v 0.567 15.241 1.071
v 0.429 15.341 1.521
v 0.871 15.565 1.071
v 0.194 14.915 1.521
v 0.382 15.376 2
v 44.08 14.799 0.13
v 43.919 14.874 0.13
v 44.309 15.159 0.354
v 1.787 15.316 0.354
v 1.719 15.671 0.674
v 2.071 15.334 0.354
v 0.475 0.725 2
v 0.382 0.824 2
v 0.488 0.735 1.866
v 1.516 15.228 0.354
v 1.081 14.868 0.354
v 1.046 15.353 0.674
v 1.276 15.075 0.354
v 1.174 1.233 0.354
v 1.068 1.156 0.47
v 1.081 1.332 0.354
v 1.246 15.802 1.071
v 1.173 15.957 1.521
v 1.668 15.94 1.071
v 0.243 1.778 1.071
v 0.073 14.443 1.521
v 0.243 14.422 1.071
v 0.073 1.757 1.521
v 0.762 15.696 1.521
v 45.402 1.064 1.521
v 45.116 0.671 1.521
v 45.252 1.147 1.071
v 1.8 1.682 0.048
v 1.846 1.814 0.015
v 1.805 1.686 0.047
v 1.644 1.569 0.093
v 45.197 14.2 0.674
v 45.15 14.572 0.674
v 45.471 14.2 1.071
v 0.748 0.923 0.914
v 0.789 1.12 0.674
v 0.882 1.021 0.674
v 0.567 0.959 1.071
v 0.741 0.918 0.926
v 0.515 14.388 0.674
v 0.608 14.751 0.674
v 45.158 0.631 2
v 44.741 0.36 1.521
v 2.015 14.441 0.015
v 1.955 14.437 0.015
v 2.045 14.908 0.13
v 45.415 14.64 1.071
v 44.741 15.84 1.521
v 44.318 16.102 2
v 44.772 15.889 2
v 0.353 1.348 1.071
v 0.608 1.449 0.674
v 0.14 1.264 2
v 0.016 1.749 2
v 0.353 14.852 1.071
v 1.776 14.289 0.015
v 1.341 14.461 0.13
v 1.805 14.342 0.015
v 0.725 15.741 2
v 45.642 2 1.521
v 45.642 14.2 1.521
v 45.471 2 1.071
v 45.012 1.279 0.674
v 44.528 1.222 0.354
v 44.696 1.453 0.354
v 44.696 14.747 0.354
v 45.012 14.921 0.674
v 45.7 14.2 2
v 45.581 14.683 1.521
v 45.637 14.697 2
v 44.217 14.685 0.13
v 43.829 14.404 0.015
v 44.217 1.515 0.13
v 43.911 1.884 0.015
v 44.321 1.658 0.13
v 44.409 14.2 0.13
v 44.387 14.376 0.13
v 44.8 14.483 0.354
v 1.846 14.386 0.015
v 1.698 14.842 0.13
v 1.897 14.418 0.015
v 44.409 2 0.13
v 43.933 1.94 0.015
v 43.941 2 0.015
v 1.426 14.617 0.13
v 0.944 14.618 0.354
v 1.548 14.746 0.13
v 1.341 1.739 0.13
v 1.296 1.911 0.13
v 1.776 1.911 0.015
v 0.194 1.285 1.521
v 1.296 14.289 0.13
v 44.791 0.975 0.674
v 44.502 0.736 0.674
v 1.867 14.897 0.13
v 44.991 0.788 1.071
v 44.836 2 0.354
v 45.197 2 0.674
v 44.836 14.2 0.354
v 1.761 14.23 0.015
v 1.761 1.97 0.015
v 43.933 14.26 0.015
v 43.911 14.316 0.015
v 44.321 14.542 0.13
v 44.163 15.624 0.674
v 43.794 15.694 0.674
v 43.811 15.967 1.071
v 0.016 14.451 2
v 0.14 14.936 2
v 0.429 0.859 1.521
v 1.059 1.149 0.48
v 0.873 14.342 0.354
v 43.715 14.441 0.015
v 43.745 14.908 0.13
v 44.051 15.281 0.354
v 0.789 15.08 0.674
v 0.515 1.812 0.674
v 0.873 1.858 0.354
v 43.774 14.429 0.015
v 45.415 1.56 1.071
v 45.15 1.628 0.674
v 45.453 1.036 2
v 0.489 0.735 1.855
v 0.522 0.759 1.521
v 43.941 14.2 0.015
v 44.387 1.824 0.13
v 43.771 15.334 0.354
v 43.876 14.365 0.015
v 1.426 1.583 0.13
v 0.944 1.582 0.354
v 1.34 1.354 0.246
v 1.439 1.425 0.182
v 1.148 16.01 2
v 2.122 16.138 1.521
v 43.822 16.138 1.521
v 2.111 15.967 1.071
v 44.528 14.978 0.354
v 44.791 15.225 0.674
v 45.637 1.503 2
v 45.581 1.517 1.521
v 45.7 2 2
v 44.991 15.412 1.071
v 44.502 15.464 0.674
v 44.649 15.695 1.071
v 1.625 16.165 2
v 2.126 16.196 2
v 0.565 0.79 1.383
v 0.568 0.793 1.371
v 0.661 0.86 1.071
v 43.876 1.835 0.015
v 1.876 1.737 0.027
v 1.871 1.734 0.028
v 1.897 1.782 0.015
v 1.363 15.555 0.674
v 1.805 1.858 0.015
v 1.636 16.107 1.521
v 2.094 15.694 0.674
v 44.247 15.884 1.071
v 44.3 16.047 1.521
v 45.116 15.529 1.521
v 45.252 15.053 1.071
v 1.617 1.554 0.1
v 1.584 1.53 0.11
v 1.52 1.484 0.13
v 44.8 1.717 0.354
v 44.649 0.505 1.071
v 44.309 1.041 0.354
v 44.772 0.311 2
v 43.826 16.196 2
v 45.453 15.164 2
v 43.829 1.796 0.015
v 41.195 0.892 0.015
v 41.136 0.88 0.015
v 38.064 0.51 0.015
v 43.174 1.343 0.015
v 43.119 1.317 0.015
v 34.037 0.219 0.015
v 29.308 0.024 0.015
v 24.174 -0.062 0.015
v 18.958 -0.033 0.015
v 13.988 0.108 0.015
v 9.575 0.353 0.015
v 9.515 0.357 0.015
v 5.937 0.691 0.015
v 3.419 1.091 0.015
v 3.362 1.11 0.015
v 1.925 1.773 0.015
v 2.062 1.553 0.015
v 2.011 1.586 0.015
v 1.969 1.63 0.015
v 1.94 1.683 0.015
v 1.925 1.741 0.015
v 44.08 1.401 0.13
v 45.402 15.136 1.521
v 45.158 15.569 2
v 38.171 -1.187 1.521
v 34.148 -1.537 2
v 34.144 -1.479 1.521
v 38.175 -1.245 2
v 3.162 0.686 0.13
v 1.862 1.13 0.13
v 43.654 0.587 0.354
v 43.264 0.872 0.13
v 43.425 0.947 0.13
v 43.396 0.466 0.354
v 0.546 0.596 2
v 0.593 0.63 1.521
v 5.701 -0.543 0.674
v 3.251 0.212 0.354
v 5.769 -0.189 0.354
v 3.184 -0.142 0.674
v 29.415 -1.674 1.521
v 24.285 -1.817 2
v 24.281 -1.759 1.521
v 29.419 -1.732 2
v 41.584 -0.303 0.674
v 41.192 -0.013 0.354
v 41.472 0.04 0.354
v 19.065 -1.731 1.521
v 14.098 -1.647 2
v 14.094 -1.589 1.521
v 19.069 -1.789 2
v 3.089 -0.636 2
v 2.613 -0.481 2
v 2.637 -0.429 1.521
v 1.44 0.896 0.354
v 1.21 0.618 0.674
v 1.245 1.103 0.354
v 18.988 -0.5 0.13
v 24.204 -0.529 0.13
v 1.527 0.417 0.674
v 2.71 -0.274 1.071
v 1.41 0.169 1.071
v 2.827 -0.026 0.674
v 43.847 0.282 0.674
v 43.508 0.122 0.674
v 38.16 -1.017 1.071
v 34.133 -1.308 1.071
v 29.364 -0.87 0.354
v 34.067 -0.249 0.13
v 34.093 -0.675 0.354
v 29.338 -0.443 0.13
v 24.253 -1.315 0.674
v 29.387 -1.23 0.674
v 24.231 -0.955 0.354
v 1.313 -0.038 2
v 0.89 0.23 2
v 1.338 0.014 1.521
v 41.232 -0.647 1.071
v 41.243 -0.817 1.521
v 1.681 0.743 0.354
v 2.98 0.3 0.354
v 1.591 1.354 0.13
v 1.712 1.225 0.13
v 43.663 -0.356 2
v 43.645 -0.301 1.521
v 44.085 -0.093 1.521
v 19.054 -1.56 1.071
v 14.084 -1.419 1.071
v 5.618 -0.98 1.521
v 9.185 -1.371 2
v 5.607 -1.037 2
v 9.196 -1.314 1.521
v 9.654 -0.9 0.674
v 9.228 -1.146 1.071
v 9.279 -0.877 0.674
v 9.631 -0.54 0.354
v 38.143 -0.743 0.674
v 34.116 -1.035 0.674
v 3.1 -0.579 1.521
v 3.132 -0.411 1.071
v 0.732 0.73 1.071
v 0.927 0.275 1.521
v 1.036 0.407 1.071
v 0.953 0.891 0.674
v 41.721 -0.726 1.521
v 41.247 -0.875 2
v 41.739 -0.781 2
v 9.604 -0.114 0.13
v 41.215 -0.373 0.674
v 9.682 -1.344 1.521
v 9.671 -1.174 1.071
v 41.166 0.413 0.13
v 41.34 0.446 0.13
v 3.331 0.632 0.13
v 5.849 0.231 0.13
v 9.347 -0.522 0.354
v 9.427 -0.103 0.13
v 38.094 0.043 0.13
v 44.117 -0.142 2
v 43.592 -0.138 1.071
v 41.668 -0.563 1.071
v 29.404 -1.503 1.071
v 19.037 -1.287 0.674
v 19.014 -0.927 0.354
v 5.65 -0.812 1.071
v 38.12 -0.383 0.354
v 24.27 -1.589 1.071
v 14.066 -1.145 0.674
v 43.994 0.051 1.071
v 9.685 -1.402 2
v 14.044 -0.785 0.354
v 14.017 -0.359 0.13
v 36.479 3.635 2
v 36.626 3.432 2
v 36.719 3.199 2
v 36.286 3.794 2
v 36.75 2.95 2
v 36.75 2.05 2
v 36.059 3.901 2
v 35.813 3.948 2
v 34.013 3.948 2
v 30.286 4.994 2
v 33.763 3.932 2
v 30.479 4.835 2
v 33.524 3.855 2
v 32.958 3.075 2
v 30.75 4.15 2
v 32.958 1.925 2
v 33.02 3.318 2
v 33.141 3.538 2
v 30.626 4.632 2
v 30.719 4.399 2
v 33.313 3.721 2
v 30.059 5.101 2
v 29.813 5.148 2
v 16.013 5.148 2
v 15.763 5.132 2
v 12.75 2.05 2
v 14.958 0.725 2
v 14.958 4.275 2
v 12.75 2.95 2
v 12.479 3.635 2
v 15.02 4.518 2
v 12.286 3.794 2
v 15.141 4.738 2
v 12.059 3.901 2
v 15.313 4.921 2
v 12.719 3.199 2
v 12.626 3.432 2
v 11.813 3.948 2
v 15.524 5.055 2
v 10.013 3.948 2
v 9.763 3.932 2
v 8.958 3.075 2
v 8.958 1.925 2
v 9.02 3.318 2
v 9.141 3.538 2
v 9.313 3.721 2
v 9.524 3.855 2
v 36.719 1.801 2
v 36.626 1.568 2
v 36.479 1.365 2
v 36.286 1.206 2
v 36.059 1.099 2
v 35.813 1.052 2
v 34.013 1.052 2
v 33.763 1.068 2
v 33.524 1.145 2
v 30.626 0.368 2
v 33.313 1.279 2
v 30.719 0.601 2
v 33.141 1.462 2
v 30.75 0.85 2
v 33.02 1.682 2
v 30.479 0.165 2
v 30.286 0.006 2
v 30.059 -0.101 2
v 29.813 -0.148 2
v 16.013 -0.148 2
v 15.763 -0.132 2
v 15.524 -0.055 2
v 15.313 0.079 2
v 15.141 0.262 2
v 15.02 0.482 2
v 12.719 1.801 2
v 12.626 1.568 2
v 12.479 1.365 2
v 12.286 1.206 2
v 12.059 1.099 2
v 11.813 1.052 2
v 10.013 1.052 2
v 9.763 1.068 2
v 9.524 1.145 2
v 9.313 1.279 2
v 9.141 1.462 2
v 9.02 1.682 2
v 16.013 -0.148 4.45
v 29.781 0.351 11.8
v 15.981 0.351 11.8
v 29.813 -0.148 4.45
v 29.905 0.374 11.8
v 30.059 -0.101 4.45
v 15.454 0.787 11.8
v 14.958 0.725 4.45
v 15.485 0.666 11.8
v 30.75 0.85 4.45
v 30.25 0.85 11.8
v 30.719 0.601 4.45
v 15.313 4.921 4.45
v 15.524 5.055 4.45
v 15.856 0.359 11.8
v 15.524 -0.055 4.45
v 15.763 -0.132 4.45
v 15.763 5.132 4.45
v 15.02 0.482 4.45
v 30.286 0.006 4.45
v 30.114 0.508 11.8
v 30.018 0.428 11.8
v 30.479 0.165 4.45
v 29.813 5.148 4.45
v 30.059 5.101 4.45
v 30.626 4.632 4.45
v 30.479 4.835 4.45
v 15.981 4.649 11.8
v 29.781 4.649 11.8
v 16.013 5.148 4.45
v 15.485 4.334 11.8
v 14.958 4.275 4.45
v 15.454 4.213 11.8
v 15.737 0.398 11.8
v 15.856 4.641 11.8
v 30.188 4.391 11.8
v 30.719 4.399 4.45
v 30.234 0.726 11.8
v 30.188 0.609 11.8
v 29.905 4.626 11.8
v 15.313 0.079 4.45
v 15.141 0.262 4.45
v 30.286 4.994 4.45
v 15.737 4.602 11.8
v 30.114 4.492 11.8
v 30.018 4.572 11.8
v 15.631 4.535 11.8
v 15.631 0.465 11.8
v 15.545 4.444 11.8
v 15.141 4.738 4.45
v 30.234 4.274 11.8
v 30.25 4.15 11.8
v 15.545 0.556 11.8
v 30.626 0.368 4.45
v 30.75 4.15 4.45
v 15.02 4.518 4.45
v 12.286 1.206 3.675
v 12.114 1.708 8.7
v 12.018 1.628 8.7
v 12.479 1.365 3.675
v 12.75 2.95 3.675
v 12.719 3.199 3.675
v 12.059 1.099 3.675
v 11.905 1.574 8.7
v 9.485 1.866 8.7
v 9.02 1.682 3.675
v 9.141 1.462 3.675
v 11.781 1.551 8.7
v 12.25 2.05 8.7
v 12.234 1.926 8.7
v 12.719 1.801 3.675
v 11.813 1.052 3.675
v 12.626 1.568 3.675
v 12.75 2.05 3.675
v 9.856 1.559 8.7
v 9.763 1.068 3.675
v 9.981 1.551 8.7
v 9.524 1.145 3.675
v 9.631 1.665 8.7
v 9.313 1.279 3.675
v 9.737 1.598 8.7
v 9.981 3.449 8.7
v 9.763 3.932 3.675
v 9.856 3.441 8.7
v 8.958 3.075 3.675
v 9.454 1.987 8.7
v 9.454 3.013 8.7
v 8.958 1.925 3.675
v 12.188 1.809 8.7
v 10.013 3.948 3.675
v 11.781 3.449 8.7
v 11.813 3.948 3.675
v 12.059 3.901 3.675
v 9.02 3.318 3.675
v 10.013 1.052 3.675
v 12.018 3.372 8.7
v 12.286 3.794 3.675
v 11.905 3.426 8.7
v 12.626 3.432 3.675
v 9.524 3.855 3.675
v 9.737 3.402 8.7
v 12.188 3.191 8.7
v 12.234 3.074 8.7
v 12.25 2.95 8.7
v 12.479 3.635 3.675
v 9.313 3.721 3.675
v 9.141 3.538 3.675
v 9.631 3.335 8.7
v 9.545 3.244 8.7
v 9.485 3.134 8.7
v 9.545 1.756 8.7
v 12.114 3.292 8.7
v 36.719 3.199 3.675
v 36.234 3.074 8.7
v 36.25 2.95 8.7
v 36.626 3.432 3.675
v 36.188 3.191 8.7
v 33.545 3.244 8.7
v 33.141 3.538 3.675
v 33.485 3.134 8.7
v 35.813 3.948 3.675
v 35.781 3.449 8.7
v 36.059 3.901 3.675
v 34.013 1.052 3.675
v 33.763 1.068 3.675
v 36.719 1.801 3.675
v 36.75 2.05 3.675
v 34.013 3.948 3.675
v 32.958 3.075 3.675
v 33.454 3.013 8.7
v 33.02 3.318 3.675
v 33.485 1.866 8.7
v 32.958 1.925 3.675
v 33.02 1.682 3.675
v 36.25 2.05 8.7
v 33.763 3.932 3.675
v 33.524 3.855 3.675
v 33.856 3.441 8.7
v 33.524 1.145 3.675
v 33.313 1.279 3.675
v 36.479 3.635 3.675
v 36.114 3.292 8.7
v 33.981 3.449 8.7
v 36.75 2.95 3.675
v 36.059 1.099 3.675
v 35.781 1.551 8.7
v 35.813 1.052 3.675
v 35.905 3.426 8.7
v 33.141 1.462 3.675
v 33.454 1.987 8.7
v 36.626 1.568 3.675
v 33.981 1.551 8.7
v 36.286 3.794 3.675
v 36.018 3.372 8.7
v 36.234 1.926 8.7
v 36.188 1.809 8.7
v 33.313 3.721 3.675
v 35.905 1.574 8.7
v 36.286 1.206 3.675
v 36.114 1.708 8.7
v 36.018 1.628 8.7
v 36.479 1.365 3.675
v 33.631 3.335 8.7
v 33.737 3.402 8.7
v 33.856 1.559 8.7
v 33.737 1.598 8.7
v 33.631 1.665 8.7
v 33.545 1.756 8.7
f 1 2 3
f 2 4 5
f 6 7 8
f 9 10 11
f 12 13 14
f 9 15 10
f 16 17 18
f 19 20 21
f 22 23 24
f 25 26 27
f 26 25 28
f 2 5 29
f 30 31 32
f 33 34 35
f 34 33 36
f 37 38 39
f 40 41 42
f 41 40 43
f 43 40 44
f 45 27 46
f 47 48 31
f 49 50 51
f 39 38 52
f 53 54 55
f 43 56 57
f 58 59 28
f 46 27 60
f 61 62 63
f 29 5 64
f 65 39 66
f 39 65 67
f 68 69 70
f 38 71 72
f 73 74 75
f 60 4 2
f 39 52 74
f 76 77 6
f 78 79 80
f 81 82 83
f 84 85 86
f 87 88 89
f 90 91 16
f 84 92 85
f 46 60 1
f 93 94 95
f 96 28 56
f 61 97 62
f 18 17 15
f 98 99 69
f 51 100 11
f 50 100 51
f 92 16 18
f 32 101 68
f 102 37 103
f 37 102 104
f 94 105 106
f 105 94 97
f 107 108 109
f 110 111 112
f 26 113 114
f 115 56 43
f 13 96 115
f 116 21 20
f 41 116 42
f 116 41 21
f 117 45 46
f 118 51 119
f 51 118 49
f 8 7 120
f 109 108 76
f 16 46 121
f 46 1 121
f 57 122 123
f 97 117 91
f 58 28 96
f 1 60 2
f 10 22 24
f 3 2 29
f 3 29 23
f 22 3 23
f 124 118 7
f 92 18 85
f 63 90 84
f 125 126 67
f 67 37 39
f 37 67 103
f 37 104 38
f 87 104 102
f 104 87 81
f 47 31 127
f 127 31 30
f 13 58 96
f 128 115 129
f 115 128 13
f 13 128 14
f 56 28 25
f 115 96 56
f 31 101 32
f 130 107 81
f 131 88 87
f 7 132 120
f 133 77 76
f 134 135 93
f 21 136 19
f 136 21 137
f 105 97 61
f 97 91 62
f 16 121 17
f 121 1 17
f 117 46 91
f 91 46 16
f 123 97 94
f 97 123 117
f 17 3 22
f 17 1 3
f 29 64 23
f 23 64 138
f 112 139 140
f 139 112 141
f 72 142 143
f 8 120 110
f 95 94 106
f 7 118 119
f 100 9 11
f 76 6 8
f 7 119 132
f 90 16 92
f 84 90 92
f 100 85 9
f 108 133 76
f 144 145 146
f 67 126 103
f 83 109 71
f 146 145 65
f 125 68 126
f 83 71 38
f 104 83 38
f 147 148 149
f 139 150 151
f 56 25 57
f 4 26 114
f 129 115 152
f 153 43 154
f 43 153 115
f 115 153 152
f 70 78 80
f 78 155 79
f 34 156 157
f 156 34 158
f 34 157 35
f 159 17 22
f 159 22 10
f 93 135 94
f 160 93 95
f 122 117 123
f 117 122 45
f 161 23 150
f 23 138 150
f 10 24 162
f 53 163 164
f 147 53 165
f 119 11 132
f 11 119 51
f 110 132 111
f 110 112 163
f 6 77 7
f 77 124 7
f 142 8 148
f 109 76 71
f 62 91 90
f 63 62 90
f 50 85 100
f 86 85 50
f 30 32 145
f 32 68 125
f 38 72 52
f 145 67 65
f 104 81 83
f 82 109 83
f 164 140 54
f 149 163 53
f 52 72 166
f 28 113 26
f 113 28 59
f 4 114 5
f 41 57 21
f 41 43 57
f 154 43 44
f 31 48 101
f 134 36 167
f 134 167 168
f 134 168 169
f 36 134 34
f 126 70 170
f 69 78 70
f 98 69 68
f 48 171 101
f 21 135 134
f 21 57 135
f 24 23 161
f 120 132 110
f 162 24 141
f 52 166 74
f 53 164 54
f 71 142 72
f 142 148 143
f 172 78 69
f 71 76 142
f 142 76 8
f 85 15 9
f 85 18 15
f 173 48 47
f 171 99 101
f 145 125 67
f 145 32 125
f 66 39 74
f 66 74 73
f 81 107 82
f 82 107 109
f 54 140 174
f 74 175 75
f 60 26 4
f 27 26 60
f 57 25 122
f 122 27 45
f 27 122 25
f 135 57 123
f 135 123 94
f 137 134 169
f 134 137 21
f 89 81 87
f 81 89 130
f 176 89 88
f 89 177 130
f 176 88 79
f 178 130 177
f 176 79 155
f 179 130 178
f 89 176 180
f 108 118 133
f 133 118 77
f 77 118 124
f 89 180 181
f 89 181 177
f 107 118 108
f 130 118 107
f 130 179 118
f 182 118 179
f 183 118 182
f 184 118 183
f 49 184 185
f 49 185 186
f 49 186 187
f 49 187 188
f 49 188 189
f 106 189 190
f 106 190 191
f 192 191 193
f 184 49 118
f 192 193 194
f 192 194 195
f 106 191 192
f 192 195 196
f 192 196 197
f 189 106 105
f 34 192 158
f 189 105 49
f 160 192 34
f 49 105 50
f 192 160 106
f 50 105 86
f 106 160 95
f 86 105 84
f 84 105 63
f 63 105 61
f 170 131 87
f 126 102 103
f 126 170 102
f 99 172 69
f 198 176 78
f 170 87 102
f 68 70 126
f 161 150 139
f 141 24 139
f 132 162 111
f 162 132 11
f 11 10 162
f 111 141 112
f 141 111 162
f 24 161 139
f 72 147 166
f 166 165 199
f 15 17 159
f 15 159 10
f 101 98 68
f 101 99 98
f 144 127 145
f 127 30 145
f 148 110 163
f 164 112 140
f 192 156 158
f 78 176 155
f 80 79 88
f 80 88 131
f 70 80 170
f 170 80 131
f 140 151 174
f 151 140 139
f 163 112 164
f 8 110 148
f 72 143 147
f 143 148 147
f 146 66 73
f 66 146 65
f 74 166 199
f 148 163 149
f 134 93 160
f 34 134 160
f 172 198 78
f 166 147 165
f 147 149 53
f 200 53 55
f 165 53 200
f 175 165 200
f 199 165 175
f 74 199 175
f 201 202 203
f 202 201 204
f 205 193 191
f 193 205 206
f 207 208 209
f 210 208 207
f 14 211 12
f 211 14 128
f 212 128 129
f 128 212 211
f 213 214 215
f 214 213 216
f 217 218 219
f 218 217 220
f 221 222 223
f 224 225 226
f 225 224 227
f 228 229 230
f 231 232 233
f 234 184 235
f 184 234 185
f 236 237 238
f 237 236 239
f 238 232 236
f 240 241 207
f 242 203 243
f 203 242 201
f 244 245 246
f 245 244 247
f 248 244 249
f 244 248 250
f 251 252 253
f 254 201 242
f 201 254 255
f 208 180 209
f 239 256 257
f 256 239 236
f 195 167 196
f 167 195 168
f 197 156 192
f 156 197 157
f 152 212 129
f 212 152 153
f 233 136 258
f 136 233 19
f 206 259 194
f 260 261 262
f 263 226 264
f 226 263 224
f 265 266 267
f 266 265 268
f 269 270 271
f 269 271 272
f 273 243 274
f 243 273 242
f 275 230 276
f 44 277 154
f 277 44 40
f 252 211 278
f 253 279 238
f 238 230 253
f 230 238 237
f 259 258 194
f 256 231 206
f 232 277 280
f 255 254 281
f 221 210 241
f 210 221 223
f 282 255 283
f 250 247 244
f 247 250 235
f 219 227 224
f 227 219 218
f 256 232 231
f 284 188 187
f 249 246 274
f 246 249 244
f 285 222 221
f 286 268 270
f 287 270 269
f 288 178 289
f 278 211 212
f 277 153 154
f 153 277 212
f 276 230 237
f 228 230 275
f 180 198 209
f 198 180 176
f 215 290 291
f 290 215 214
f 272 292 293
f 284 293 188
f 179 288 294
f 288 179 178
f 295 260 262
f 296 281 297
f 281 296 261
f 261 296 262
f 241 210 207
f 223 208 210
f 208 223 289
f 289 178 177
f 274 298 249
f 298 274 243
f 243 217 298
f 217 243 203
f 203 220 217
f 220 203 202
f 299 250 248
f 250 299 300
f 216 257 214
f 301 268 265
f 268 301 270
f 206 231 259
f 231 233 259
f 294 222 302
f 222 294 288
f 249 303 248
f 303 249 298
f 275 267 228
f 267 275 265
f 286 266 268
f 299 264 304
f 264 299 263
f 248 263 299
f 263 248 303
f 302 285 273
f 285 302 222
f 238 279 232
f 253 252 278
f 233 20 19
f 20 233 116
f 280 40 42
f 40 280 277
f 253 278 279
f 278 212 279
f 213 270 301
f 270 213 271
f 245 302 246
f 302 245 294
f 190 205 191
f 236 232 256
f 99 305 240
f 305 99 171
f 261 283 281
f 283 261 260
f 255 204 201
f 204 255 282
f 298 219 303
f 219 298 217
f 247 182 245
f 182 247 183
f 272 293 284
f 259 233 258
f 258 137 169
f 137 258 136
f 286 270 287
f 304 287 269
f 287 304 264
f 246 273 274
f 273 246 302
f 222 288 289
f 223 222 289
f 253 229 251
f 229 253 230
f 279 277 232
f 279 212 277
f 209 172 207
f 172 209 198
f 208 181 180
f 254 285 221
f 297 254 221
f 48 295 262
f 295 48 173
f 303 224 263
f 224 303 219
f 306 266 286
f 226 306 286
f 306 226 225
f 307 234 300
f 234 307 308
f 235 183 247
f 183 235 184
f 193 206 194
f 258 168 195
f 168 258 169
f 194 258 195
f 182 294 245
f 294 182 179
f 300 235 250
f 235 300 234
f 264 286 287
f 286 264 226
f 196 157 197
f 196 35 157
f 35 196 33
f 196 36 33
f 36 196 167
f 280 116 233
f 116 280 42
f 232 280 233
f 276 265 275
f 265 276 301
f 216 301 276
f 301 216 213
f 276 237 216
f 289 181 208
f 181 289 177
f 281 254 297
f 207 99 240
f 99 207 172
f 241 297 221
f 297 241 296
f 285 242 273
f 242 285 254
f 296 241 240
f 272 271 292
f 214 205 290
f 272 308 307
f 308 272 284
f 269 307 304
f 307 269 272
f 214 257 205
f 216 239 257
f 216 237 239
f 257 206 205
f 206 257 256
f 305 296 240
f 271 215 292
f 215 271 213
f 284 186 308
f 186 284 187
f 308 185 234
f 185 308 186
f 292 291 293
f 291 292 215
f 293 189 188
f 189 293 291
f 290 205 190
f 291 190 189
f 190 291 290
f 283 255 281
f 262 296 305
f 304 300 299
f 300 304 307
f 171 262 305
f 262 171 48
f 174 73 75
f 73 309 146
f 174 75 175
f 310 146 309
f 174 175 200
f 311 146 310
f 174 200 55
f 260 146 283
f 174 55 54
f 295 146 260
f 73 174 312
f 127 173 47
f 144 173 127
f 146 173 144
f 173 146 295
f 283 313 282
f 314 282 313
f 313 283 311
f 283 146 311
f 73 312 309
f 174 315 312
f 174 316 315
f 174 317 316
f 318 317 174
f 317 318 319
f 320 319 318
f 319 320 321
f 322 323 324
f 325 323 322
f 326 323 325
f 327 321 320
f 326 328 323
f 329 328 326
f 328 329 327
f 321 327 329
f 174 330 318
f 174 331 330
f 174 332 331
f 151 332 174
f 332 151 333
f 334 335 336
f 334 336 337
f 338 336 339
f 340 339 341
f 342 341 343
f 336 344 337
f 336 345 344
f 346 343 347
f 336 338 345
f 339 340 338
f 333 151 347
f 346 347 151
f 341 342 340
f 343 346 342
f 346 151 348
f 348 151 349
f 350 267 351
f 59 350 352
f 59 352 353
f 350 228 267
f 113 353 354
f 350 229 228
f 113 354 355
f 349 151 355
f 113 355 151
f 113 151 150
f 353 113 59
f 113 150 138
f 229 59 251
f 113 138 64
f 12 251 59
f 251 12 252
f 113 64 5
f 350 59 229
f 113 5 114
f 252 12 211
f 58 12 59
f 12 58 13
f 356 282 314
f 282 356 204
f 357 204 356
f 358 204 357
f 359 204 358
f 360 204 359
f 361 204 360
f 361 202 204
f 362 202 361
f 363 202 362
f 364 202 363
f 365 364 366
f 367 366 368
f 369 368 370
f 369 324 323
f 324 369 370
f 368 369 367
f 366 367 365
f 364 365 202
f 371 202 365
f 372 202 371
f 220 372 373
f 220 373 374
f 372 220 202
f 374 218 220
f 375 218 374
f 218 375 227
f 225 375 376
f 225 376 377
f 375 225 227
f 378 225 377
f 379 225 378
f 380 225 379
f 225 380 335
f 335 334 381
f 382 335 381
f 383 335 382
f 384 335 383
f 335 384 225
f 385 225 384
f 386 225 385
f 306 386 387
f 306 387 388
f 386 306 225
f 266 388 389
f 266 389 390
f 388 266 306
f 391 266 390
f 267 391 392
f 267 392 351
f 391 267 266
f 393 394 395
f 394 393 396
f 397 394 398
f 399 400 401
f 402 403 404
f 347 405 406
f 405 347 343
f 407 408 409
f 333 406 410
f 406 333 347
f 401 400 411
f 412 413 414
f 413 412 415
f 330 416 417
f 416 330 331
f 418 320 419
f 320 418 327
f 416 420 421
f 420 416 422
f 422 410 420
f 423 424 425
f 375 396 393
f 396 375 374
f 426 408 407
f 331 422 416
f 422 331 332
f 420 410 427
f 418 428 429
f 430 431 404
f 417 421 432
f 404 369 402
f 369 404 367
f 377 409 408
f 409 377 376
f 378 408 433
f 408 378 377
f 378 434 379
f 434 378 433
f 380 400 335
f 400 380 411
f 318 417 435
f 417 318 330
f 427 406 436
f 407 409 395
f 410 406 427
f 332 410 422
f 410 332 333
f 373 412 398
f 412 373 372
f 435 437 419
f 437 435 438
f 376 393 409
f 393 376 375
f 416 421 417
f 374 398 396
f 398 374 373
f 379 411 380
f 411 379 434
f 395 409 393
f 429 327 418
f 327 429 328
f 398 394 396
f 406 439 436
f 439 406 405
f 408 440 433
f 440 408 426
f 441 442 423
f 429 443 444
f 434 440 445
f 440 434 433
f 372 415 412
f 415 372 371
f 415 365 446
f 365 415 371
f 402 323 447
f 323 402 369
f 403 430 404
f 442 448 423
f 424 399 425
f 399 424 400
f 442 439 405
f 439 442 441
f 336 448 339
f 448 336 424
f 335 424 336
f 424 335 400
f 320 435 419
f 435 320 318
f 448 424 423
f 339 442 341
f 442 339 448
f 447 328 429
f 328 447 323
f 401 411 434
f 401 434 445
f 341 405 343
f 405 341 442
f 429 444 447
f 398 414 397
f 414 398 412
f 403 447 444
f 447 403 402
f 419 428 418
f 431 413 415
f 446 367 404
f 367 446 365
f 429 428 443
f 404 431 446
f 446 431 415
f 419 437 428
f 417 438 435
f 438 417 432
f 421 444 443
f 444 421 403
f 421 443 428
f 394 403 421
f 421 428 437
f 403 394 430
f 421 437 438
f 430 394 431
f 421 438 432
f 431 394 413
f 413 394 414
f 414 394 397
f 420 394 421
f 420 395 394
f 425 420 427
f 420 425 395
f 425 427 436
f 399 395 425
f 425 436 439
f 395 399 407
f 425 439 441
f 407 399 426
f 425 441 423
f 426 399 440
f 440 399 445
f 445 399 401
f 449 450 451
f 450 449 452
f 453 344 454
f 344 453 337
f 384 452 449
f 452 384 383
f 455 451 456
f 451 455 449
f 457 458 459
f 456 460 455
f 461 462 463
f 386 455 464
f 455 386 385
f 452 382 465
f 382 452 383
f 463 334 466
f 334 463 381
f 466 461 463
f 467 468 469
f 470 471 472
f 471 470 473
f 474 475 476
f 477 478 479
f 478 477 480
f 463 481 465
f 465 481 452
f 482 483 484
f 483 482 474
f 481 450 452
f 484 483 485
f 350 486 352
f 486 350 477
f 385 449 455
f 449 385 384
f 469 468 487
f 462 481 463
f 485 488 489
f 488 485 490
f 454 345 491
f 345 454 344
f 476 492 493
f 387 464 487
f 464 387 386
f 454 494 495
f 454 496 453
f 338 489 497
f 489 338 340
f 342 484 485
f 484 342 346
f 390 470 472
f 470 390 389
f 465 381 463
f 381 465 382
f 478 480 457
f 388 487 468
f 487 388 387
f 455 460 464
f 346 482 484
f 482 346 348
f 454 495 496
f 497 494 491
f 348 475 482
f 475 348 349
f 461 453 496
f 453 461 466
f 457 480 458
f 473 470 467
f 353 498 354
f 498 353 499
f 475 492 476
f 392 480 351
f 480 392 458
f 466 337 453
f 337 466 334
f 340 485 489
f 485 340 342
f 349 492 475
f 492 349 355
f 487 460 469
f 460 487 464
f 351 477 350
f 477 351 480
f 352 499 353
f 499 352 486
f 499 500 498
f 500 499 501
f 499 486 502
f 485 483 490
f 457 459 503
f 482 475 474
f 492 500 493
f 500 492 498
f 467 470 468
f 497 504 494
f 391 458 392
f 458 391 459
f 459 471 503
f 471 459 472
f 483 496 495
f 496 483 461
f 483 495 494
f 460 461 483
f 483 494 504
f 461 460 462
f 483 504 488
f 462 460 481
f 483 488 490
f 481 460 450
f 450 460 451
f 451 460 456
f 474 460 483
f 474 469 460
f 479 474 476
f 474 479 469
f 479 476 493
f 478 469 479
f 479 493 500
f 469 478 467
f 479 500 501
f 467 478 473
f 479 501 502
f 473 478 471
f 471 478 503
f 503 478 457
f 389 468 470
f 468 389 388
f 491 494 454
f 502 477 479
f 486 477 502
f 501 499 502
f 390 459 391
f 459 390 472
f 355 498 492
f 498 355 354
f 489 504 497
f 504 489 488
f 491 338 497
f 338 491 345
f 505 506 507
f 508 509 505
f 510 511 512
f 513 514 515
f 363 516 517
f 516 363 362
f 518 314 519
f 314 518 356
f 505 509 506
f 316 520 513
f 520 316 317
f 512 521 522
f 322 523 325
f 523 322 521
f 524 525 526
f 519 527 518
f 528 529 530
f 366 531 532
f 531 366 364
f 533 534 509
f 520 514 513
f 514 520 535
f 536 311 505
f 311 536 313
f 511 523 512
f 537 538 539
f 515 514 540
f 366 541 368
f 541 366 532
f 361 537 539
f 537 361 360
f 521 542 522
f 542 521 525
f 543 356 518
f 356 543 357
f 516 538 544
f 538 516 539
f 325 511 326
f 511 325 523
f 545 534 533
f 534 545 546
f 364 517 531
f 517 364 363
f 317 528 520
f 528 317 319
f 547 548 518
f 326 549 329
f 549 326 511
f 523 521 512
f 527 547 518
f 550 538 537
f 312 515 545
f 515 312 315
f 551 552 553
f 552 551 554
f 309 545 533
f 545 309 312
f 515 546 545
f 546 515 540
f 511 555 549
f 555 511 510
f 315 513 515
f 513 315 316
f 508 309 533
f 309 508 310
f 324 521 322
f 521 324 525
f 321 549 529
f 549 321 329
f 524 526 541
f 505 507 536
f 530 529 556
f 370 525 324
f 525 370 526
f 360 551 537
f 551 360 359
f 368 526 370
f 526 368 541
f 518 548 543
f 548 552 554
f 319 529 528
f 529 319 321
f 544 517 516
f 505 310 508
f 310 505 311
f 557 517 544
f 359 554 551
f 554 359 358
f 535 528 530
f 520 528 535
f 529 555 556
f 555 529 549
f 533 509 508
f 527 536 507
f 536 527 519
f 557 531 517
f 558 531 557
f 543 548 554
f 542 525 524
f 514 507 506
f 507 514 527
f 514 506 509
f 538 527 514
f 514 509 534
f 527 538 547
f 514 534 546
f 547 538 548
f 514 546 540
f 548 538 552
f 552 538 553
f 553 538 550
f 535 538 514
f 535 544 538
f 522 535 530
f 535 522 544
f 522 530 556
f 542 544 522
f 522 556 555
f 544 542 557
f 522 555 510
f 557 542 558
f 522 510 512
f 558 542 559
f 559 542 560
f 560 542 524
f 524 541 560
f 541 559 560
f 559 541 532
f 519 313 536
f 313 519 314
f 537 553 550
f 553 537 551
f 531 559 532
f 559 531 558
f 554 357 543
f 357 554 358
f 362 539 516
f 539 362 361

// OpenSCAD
$fn=25;
base_x=45.7;
base_y=15.5-1.3;
base_z=2;

center_x=15.8;
center_y=5.3;
center_z=9.8;

side_x=3.8;
side_y=2.9;
side_z=6.7;

insert_offset=2.5;
side_offset=12;
base_radius=2;

arc=6-base_radius;
arc_scale=arc/base_x;

radius=1;
taper=0.5;
div=4;


//base
difference() {
    translate([base_radius,base_radius,base_radius])
    minkowski() {
        union() {
            cube([base_x-base_radius*2,base_y-base_radius,base_z]);

            scale([1,arc_scale,1])
            translate([base_x/2-base_radius,0,0])
            cylinder(r=base_x/2-base_radius,h=base_z);
        }
        sphere(r=base_radius);
    }
    translate([-base_radius,-base_radius,base_z])
    cube([base_x*2,base_y*2,base_z*2]);
}

//center
minkowski() {
    translate([base_x/2-center_x/2+radius,-center_y/2+insert_offset+radius,base_z])
    cube([center_x-radius*2,center_y-radius*2,center_z/div]);
    cylinder(r1=radius,r2=radius-taper,h=center_z*(div-1)/div);
}

//left
minkowski() {
    translate([base_x/2-side_x/2-side_offset+radius,-side_y/2+insert_offset+radius,base_z])
    cube([side_x-radius*2,side_y-radius*2,side_z/div]);
    cylinder(r1=radius,r2=radius-taper,h=side_z*(div-1)/div);
}

//right
minkowski() {
    translate([base_x/2-side_x/2+side_offset+radius,-side_y/2+insert_offset+radius,base_z])
    cube([side_x-radius*2,side_y-radius*2,side_z/div]);
    cylinder(r1=radius,r2=radius-taper,h=side_z*(div-1)/div);
}
